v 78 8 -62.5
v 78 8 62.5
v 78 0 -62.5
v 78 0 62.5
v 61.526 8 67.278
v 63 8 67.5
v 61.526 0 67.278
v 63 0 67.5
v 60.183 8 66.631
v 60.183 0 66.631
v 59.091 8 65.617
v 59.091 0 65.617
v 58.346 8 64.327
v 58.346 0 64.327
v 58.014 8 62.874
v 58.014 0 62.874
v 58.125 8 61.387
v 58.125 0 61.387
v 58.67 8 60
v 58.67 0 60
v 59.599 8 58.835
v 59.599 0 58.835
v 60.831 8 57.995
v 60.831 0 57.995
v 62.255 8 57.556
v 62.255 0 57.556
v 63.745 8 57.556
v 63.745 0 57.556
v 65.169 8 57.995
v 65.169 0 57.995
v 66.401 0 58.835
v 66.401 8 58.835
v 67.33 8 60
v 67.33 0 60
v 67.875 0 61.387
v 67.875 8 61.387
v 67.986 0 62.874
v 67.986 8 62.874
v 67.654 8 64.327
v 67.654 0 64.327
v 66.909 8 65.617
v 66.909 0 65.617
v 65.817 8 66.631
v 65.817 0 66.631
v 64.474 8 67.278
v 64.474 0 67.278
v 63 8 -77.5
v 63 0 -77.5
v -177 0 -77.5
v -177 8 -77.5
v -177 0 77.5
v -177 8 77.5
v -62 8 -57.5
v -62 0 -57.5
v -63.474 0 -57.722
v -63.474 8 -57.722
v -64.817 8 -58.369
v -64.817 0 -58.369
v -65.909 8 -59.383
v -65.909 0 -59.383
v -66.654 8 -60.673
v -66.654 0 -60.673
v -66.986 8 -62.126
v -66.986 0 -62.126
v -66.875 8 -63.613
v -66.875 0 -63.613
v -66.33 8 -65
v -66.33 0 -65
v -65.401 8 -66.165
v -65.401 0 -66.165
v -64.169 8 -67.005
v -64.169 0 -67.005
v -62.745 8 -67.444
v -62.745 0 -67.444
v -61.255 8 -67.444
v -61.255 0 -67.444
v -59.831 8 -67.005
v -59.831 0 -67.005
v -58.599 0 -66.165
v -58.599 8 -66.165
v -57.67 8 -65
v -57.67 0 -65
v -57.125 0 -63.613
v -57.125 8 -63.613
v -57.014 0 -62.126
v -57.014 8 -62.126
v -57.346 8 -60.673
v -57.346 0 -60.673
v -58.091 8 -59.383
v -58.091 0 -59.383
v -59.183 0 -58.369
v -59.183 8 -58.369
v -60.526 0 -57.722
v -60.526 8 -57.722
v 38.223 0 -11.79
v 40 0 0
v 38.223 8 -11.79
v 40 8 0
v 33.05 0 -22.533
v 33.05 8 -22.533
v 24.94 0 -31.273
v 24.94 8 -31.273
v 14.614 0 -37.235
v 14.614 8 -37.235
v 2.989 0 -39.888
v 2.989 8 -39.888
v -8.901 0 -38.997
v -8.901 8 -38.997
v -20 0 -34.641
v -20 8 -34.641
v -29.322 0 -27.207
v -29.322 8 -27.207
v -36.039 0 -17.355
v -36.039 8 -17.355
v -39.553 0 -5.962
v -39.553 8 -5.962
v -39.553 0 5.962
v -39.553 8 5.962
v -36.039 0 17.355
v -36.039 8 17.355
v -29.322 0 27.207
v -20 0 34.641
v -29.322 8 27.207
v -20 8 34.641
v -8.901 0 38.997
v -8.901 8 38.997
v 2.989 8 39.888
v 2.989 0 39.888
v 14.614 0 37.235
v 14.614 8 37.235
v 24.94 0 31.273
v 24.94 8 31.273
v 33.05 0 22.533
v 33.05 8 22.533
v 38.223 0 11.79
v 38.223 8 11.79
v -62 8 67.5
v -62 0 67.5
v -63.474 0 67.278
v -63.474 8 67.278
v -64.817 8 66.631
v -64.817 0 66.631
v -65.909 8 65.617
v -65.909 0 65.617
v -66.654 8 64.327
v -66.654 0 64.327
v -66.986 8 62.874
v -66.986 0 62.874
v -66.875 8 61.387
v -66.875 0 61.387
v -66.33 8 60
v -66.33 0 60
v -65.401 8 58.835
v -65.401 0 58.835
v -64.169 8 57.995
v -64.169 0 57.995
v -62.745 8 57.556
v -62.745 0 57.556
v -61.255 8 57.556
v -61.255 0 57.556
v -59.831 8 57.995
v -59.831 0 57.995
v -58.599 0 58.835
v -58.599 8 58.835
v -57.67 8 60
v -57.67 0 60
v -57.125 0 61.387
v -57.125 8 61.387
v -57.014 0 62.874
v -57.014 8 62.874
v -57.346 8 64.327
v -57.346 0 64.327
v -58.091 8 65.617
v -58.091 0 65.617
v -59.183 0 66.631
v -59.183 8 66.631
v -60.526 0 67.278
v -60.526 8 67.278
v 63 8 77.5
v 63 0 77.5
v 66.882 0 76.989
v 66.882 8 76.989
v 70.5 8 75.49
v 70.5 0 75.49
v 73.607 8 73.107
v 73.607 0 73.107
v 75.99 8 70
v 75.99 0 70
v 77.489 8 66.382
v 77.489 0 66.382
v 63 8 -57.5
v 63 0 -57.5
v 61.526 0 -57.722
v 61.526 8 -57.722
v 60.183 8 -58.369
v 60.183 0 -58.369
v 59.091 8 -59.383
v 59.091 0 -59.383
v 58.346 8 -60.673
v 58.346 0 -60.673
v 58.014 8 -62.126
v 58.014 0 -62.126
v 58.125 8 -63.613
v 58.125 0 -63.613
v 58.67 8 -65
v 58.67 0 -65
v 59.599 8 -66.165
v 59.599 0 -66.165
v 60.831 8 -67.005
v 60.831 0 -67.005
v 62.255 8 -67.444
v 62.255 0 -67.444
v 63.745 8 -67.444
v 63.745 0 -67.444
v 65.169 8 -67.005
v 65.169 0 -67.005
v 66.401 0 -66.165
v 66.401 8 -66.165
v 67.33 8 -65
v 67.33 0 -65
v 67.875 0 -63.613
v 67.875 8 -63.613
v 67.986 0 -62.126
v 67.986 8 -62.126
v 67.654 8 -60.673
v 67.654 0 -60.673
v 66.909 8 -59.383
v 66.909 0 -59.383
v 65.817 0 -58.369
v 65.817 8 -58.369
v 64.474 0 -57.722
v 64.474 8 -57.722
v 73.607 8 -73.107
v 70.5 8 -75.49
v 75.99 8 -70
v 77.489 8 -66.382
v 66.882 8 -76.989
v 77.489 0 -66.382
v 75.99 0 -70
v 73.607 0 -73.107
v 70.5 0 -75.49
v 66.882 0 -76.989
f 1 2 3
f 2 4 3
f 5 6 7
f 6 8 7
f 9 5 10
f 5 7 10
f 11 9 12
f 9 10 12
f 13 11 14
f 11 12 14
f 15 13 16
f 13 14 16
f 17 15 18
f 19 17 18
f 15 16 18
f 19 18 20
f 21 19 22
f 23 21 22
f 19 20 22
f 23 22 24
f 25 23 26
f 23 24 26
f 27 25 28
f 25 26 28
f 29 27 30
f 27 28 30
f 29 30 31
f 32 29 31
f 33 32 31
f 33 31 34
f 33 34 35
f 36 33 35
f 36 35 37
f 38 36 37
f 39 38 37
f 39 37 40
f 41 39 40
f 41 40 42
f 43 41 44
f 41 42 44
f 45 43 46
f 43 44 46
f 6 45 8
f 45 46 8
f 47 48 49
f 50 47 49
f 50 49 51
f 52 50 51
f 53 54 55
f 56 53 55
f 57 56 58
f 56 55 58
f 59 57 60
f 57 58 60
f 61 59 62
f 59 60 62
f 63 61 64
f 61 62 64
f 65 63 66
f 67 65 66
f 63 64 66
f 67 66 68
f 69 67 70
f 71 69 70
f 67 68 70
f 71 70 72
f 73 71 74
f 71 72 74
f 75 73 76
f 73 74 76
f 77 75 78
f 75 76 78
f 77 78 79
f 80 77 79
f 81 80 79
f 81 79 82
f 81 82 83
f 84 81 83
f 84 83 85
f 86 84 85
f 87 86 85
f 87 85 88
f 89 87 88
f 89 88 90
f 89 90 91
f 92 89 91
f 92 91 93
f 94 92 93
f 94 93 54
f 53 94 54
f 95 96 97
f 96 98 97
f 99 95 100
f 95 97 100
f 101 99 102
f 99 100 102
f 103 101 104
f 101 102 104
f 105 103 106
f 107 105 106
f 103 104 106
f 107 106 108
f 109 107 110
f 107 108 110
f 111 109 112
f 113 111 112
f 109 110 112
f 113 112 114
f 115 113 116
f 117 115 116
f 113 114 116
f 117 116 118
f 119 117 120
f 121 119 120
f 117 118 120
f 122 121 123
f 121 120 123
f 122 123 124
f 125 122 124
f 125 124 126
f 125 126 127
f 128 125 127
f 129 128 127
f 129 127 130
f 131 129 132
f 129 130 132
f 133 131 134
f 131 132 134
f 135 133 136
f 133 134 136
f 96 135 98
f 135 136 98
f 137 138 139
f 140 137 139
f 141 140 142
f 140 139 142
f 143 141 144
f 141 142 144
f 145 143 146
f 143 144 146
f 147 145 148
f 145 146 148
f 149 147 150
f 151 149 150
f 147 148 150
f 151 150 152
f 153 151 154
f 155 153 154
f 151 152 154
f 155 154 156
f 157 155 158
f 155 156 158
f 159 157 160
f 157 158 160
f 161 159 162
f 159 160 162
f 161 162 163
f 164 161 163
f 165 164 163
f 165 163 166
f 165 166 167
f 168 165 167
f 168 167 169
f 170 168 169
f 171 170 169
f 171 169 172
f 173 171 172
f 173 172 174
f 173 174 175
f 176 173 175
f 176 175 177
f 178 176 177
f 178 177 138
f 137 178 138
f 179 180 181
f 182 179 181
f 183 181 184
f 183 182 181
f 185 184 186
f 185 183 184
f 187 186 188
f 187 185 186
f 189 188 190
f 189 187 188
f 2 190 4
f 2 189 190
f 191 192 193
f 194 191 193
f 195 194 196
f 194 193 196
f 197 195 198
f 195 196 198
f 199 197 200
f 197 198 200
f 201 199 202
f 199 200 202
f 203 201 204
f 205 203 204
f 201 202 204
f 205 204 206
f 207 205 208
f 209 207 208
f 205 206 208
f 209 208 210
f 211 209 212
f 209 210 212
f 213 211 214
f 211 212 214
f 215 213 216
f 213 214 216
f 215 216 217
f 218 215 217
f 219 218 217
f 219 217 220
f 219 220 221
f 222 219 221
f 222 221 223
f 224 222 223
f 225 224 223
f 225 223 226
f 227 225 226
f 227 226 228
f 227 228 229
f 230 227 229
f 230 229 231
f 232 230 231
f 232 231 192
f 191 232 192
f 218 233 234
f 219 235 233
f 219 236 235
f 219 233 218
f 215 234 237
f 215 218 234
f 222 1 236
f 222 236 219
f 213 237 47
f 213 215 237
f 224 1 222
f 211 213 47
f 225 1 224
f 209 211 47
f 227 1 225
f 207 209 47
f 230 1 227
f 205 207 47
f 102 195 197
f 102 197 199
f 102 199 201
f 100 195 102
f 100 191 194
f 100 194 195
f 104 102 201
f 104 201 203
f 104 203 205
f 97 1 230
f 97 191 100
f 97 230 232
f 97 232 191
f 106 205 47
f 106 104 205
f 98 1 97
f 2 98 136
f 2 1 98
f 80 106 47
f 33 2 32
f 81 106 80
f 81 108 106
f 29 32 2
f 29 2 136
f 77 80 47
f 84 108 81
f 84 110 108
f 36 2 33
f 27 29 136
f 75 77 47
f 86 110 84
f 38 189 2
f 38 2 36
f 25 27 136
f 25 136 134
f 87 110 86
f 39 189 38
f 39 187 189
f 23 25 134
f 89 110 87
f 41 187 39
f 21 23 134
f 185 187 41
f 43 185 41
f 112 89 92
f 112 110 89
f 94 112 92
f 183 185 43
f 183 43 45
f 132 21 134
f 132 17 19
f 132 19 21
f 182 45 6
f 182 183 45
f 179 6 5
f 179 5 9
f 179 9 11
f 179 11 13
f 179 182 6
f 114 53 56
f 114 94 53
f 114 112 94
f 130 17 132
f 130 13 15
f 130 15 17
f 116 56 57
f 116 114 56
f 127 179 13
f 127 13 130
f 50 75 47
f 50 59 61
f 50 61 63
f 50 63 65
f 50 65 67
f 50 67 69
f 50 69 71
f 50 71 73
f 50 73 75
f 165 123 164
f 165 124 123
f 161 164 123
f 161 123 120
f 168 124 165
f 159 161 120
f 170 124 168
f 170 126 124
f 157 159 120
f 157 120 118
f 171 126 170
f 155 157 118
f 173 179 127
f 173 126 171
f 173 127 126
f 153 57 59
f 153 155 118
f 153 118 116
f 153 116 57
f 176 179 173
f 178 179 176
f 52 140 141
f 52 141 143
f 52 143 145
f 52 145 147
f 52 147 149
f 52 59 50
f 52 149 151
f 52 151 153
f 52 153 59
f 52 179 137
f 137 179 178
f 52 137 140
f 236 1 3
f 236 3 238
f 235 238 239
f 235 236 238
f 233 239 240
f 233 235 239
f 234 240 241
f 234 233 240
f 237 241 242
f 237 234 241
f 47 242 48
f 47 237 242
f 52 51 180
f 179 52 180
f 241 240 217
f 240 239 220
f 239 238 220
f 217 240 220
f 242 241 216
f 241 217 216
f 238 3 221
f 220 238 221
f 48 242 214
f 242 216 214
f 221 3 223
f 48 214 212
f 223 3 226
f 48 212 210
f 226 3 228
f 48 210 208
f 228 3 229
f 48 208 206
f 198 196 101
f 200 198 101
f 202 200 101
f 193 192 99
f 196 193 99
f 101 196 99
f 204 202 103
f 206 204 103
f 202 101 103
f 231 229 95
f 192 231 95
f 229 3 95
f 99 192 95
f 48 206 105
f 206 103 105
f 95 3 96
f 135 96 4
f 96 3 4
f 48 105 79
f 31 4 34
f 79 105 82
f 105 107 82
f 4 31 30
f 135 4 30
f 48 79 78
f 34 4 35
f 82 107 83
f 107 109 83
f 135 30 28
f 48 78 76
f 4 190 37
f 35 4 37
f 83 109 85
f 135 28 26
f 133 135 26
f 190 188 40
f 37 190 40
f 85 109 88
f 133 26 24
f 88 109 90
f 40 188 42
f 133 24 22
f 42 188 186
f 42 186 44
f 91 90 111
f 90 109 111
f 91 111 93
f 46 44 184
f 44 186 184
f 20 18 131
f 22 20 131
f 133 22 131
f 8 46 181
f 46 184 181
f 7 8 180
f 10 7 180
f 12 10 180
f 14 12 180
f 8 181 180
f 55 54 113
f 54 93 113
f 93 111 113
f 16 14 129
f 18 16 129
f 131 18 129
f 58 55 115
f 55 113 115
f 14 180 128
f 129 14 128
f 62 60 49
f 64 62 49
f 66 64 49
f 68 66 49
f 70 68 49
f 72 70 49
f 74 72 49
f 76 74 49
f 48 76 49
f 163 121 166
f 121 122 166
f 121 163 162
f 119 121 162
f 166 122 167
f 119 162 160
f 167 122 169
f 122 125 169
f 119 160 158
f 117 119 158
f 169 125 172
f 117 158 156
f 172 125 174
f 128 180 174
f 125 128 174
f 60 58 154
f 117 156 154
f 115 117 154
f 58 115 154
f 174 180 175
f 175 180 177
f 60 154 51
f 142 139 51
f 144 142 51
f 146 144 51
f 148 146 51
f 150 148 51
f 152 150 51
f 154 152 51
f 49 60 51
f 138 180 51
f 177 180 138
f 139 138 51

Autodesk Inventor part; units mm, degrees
ref_plane "YZ Plane" through (0, 0, 0) normal (1, 0, 0) x (0, 1, 0)
ref_plane "XZ Plane" through (0, 0, 0) normal (0, 1, 0) x (-1, 0, 0)
ref_plane "XY Plane" through (0, 0, 0) normal (0, 0, 1) x (1, 0, 0)
sketch "Sketch1" plane through (0, 0, 0) normal (0, 1, 0) x (-1, 0, 0)
  line L0 (177, 77.5) -> (-78, 77.5)
  line L1 (-78, 77.5) -> (-78, -77.5)
  line L2 (-78, -77.5) -> (177, -77.5)
  line L3 (177, -77.5) -> (177, 77.5)
  point P0 (0, 0)
  dimension "d0" = 155
  dimension "d1" = 77.5
  dimension "d2" = 78
  dimension "d3" = 255
extrude "Extrusion1" add sketch "Sketch1" along normal blind 8
fillet "Fillet1" radius 15 2 edges at (78, 4, -77.5) (78, 4, 77.5)
sketch "Sketch2" plane through (0, 8, 0) normal (0, 1, 0) x (1, 0, 0)
  arc A0 (63, -77.5) -> (78, -62.5) centre (63, -62.5) ccw projected
  line L0 (63, -62.5) -> (-62, -62.5)
  line L1 (-62, -62.5) -> (-62, 62.5)
  line L2 (-62, 62.5) -> (63, 62.5)
  line L3 (63, 62.5) -> (63, -62.5)
  point P0 (0, 0)
  dimension "d7" = 125
hole "Hole1" at (-62, 8, 62.5) at (63, 8, 62.5) at (63, 8, -62.5) at (-62, 8, -62.5) direction (0, -1, 0) diameter 10 end through all
sketch "Sketch3" plane through (0, 8, 0) normal (0, 1, 0) x (1, 0, 0)
  circle A0 centre (0, 0) radius 40
  dimension "d15" = 80
extrude "Extrusion2" cut sketch "Sketch3" against normal through all
properties part number "BRACKET BASE"
